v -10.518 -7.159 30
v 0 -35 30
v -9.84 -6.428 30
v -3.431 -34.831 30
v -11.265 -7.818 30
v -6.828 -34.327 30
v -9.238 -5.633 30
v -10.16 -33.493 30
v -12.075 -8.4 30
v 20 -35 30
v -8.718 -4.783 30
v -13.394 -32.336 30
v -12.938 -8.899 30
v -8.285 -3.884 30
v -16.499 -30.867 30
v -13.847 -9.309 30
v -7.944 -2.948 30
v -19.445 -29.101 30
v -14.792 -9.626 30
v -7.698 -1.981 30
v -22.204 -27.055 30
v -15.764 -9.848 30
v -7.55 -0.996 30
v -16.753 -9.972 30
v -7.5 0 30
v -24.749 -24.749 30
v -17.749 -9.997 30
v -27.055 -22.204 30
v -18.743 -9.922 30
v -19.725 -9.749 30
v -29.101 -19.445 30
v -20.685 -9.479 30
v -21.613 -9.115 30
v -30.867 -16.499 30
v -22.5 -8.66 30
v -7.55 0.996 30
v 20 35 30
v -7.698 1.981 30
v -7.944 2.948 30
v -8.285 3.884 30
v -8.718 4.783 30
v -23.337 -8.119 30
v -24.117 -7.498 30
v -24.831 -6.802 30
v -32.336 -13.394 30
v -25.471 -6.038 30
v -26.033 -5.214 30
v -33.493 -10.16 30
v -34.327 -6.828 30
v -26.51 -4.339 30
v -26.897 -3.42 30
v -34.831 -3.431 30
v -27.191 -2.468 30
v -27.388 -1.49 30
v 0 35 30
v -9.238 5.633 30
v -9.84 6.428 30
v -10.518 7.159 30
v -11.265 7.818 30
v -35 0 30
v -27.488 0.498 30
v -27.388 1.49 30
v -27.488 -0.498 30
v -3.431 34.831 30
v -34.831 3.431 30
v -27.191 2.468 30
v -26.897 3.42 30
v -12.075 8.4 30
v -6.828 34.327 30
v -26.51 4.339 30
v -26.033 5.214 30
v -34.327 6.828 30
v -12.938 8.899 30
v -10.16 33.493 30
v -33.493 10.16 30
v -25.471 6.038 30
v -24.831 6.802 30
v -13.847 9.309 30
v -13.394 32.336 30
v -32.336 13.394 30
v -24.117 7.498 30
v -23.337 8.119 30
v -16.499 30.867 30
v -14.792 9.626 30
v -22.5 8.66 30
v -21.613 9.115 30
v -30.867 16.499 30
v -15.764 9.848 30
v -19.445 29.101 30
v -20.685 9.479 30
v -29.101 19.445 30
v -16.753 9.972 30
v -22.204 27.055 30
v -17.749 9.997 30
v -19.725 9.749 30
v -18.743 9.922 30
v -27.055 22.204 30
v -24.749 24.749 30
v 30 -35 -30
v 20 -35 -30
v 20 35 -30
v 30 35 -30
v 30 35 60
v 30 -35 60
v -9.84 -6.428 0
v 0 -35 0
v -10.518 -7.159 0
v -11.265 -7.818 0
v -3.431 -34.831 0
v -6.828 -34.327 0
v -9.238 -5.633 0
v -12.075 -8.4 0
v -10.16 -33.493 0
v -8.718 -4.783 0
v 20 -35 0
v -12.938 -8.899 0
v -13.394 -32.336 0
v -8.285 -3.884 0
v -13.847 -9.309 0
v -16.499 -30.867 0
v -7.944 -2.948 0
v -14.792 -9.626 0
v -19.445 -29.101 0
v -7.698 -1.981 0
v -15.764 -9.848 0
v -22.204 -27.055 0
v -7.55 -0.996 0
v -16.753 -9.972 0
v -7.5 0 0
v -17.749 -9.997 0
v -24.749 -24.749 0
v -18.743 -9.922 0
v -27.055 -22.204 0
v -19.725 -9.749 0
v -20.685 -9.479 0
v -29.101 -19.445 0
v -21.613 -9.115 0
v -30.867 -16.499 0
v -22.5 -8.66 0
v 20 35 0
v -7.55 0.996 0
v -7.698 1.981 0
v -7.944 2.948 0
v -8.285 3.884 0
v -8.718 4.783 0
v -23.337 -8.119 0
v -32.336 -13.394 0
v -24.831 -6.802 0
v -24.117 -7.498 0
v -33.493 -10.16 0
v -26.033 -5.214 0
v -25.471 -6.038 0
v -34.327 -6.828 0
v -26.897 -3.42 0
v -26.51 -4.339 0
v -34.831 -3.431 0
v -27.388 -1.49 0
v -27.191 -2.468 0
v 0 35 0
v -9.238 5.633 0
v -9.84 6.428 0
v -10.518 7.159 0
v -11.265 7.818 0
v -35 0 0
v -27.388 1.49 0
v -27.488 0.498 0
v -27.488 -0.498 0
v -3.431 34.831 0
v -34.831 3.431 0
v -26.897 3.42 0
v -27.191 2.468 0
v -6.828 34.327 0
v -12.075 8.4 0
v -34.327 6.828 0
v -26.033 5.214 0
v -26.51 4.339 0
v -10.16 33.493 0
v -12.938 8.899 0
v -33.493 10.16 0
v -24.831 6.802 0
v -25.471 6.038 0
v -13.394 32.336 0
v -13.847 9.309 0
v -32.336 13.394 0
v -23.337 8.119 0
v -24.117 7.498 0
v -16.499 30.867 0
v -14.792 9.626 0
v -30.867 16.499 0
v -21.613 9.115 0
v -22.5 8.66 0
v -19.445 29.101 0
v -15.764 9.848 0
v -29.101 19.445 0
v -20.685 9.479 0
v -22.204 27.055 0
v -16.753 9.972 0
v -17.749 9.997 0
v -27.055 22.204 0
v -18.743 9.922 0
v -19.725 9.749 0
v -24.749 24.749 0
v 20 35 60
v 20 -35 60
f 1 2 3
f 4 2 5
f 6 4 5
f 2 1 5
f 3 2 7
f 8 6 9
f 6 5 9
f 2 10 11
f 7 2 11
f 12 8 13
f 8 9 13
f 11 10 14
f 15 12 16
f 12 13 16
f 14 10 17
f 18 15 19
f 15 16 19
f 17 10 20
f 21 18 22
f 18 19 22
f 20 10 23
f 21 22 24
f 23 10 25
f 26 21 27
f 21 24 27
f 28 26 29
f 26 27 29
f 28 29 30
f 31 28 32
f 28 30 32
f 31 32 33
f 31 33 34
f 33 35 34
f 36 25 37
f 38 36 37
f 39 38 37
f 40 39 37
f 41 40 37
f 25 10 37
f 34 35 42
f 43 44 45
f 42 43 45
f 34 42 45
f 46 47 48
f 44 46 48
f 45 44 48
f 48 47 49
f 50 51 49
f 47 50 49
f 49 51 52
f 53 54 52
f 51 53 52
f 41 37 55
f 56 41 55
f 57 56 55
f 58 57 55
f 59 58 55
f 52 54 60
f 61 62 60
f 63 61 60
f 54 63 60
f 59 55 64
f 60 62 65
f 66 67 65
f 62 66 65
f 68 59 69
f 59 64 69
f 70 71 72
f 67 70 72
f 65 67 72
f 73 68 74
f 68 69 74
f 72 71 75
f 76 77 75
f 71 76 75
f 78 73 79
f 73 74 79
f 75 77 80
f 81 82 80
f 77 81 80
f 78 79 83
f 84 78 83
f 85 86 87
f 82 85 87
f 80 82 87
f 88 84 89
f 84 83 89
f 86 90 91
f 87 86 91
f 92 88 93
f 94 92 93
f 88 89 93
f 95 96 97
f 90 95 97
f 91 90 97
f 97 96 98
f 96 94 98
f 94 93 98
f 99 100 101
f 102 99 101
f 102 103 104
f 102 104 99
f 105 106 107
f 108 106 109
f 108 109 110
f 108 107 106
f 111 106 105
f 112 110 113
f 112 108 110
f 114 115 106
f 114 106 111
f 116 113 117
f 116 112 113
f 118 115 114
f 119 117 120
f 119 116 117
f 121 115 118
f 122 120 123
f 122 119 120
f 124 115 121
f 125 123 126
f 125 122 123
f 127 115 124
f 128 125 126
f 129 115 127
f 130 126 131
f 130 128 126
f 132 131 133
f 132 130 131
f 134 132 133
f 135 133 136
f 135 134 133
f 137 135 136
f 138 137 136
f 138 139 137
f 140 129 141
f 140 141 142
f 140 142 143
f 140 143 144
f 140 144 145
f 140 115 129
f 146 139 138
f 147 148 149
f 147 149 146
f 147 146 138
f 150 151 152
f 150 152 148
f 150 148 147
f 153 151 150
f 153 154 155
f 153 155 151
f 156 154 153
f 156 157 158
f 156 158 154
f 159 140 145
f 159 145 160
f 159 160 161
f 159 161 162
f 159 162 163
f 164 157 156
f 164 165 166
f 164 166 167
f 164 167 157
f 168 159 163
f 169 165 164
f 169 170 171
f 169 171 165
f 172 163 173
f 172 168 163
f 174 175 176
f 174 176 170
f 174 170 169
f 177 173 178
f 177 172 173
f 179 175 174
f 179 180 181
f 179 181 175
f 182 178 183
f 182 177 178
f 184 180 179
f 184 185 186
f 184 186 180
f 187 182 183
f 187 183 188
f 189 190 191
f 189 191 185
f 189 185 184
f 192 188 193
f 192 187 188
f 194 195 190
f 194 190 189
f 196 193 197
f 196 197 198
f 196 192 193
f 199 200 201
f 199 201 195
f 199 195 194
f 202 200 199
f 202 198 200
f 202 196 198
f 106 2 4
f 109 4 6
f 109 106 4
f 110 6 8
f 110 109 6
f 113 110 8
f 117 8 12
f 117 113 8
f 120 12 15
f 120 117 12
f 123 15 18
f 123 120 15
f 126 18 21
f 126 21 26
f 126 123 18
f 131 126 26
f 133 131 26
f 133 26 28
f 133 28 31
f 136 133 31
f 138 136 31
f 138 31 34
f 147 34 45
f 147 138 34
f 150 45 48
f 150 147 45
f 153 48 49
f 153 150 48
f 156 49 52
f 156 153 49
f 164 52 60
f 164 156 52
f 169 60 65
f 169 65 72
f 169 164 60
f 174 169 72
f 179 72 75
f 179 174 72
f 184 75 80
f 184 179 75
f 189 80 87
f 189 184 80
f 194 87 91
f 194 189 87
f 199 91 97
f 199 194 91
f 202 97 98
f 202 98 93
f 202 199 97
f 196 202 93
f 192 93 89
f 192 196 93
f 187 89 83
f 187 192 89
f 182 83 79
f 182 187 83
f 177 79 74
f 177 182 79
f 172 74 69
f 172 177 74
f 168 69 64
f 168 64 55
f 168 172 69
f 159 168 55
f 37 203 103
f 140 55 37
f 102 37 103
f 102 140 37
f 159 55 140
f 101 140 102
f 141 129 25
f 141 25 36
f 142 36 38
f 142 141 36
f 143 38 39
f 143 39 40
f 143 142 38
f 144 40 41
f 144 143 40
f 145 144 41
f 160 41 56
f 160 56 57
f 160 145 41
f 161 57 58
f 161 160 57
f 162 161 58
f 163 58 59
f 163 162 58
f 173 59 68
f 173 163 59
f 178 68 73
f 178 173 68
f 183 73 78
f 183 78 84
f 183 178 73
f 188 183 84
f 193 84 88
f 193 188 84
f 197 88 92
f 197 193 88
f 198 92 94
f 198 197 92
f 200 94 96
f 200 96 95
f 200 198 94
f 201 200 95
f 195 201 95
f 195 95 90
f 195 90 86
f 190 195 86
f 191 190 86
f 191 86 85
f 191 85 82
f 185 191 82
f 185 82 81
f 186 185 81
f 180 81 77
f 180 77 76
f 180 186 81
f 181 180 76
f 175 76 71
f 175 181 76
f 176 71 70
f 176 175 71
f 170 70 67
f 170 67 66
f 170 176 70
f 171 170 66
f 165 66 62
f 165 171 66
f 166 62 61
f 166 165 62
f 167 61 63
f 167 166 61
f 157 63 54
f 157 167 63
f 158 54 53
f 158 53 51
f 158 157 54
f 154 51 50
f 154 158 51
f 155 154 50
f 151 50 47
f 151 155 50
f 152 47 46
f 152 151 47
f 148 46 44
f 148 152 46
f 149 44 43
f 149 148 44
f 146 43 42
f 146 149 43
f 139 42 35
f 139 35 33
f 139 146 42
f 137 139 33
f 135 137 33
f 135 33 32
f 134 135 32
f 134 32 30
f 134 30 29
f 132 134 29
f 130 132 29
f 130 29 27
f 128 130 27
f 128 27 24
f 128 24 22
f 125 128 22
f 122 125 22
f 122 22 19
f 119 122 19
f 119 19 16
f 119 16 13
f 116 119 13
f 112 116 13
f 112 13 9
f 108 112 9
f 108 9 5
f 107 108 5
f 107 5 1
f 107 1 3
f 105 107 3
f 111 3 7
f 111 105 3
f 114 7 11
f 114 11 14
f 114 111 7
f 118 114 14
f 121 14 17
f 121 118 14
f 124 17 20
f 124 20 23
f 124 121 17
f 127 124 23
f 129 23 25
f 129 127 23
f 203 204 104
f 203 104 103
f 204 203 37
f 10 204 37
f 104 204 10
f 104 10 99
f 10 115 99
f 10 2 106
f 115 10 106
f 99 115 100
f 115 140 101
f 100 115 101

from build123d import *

# Parameters (mm, degrees)
SKETCH1_R           = 10
BOSS_EXTRUDE1_DEPTH = 30
SKETCH2_W           = 90
SKETCH2_H           = 70
BOSS_EXTRUDE2_DEPTH = 10


with BuildPart() as part:
    # Sketch1 → Boss-Extrude1 (new body)
    with BuildSketch(Plane.XY):
        with BuildLine():
            Line((0, 35), (20, 35))
            Line((20, 35), (20, -35))
            Line((20, -35), (0, -35))
            ThreePointArc((0, -35), (-35, 0), (0, 35))
        make_face()
        with Locations((-17.5, 0)):
            Circle(SKETCH1_R, mode=Mode.SUBTRACT)
    extrude(amount=BOSS_EXTRUDE1_DEPTH)

    # Sketch2 → Boss-Extrude2 (add)
    with BuildSketch(Plane(origin=(20, 0, 0), x_dir=(0, 0, -1), z_dir=(1, 0, 0))):
        with Locations((-15, 0)):
            Rectangle(SKETCH2_W, SKETCH2_H)
    extrude(amount=BOSS_EXTRUDE2_DEPTH)


solid = part.part
